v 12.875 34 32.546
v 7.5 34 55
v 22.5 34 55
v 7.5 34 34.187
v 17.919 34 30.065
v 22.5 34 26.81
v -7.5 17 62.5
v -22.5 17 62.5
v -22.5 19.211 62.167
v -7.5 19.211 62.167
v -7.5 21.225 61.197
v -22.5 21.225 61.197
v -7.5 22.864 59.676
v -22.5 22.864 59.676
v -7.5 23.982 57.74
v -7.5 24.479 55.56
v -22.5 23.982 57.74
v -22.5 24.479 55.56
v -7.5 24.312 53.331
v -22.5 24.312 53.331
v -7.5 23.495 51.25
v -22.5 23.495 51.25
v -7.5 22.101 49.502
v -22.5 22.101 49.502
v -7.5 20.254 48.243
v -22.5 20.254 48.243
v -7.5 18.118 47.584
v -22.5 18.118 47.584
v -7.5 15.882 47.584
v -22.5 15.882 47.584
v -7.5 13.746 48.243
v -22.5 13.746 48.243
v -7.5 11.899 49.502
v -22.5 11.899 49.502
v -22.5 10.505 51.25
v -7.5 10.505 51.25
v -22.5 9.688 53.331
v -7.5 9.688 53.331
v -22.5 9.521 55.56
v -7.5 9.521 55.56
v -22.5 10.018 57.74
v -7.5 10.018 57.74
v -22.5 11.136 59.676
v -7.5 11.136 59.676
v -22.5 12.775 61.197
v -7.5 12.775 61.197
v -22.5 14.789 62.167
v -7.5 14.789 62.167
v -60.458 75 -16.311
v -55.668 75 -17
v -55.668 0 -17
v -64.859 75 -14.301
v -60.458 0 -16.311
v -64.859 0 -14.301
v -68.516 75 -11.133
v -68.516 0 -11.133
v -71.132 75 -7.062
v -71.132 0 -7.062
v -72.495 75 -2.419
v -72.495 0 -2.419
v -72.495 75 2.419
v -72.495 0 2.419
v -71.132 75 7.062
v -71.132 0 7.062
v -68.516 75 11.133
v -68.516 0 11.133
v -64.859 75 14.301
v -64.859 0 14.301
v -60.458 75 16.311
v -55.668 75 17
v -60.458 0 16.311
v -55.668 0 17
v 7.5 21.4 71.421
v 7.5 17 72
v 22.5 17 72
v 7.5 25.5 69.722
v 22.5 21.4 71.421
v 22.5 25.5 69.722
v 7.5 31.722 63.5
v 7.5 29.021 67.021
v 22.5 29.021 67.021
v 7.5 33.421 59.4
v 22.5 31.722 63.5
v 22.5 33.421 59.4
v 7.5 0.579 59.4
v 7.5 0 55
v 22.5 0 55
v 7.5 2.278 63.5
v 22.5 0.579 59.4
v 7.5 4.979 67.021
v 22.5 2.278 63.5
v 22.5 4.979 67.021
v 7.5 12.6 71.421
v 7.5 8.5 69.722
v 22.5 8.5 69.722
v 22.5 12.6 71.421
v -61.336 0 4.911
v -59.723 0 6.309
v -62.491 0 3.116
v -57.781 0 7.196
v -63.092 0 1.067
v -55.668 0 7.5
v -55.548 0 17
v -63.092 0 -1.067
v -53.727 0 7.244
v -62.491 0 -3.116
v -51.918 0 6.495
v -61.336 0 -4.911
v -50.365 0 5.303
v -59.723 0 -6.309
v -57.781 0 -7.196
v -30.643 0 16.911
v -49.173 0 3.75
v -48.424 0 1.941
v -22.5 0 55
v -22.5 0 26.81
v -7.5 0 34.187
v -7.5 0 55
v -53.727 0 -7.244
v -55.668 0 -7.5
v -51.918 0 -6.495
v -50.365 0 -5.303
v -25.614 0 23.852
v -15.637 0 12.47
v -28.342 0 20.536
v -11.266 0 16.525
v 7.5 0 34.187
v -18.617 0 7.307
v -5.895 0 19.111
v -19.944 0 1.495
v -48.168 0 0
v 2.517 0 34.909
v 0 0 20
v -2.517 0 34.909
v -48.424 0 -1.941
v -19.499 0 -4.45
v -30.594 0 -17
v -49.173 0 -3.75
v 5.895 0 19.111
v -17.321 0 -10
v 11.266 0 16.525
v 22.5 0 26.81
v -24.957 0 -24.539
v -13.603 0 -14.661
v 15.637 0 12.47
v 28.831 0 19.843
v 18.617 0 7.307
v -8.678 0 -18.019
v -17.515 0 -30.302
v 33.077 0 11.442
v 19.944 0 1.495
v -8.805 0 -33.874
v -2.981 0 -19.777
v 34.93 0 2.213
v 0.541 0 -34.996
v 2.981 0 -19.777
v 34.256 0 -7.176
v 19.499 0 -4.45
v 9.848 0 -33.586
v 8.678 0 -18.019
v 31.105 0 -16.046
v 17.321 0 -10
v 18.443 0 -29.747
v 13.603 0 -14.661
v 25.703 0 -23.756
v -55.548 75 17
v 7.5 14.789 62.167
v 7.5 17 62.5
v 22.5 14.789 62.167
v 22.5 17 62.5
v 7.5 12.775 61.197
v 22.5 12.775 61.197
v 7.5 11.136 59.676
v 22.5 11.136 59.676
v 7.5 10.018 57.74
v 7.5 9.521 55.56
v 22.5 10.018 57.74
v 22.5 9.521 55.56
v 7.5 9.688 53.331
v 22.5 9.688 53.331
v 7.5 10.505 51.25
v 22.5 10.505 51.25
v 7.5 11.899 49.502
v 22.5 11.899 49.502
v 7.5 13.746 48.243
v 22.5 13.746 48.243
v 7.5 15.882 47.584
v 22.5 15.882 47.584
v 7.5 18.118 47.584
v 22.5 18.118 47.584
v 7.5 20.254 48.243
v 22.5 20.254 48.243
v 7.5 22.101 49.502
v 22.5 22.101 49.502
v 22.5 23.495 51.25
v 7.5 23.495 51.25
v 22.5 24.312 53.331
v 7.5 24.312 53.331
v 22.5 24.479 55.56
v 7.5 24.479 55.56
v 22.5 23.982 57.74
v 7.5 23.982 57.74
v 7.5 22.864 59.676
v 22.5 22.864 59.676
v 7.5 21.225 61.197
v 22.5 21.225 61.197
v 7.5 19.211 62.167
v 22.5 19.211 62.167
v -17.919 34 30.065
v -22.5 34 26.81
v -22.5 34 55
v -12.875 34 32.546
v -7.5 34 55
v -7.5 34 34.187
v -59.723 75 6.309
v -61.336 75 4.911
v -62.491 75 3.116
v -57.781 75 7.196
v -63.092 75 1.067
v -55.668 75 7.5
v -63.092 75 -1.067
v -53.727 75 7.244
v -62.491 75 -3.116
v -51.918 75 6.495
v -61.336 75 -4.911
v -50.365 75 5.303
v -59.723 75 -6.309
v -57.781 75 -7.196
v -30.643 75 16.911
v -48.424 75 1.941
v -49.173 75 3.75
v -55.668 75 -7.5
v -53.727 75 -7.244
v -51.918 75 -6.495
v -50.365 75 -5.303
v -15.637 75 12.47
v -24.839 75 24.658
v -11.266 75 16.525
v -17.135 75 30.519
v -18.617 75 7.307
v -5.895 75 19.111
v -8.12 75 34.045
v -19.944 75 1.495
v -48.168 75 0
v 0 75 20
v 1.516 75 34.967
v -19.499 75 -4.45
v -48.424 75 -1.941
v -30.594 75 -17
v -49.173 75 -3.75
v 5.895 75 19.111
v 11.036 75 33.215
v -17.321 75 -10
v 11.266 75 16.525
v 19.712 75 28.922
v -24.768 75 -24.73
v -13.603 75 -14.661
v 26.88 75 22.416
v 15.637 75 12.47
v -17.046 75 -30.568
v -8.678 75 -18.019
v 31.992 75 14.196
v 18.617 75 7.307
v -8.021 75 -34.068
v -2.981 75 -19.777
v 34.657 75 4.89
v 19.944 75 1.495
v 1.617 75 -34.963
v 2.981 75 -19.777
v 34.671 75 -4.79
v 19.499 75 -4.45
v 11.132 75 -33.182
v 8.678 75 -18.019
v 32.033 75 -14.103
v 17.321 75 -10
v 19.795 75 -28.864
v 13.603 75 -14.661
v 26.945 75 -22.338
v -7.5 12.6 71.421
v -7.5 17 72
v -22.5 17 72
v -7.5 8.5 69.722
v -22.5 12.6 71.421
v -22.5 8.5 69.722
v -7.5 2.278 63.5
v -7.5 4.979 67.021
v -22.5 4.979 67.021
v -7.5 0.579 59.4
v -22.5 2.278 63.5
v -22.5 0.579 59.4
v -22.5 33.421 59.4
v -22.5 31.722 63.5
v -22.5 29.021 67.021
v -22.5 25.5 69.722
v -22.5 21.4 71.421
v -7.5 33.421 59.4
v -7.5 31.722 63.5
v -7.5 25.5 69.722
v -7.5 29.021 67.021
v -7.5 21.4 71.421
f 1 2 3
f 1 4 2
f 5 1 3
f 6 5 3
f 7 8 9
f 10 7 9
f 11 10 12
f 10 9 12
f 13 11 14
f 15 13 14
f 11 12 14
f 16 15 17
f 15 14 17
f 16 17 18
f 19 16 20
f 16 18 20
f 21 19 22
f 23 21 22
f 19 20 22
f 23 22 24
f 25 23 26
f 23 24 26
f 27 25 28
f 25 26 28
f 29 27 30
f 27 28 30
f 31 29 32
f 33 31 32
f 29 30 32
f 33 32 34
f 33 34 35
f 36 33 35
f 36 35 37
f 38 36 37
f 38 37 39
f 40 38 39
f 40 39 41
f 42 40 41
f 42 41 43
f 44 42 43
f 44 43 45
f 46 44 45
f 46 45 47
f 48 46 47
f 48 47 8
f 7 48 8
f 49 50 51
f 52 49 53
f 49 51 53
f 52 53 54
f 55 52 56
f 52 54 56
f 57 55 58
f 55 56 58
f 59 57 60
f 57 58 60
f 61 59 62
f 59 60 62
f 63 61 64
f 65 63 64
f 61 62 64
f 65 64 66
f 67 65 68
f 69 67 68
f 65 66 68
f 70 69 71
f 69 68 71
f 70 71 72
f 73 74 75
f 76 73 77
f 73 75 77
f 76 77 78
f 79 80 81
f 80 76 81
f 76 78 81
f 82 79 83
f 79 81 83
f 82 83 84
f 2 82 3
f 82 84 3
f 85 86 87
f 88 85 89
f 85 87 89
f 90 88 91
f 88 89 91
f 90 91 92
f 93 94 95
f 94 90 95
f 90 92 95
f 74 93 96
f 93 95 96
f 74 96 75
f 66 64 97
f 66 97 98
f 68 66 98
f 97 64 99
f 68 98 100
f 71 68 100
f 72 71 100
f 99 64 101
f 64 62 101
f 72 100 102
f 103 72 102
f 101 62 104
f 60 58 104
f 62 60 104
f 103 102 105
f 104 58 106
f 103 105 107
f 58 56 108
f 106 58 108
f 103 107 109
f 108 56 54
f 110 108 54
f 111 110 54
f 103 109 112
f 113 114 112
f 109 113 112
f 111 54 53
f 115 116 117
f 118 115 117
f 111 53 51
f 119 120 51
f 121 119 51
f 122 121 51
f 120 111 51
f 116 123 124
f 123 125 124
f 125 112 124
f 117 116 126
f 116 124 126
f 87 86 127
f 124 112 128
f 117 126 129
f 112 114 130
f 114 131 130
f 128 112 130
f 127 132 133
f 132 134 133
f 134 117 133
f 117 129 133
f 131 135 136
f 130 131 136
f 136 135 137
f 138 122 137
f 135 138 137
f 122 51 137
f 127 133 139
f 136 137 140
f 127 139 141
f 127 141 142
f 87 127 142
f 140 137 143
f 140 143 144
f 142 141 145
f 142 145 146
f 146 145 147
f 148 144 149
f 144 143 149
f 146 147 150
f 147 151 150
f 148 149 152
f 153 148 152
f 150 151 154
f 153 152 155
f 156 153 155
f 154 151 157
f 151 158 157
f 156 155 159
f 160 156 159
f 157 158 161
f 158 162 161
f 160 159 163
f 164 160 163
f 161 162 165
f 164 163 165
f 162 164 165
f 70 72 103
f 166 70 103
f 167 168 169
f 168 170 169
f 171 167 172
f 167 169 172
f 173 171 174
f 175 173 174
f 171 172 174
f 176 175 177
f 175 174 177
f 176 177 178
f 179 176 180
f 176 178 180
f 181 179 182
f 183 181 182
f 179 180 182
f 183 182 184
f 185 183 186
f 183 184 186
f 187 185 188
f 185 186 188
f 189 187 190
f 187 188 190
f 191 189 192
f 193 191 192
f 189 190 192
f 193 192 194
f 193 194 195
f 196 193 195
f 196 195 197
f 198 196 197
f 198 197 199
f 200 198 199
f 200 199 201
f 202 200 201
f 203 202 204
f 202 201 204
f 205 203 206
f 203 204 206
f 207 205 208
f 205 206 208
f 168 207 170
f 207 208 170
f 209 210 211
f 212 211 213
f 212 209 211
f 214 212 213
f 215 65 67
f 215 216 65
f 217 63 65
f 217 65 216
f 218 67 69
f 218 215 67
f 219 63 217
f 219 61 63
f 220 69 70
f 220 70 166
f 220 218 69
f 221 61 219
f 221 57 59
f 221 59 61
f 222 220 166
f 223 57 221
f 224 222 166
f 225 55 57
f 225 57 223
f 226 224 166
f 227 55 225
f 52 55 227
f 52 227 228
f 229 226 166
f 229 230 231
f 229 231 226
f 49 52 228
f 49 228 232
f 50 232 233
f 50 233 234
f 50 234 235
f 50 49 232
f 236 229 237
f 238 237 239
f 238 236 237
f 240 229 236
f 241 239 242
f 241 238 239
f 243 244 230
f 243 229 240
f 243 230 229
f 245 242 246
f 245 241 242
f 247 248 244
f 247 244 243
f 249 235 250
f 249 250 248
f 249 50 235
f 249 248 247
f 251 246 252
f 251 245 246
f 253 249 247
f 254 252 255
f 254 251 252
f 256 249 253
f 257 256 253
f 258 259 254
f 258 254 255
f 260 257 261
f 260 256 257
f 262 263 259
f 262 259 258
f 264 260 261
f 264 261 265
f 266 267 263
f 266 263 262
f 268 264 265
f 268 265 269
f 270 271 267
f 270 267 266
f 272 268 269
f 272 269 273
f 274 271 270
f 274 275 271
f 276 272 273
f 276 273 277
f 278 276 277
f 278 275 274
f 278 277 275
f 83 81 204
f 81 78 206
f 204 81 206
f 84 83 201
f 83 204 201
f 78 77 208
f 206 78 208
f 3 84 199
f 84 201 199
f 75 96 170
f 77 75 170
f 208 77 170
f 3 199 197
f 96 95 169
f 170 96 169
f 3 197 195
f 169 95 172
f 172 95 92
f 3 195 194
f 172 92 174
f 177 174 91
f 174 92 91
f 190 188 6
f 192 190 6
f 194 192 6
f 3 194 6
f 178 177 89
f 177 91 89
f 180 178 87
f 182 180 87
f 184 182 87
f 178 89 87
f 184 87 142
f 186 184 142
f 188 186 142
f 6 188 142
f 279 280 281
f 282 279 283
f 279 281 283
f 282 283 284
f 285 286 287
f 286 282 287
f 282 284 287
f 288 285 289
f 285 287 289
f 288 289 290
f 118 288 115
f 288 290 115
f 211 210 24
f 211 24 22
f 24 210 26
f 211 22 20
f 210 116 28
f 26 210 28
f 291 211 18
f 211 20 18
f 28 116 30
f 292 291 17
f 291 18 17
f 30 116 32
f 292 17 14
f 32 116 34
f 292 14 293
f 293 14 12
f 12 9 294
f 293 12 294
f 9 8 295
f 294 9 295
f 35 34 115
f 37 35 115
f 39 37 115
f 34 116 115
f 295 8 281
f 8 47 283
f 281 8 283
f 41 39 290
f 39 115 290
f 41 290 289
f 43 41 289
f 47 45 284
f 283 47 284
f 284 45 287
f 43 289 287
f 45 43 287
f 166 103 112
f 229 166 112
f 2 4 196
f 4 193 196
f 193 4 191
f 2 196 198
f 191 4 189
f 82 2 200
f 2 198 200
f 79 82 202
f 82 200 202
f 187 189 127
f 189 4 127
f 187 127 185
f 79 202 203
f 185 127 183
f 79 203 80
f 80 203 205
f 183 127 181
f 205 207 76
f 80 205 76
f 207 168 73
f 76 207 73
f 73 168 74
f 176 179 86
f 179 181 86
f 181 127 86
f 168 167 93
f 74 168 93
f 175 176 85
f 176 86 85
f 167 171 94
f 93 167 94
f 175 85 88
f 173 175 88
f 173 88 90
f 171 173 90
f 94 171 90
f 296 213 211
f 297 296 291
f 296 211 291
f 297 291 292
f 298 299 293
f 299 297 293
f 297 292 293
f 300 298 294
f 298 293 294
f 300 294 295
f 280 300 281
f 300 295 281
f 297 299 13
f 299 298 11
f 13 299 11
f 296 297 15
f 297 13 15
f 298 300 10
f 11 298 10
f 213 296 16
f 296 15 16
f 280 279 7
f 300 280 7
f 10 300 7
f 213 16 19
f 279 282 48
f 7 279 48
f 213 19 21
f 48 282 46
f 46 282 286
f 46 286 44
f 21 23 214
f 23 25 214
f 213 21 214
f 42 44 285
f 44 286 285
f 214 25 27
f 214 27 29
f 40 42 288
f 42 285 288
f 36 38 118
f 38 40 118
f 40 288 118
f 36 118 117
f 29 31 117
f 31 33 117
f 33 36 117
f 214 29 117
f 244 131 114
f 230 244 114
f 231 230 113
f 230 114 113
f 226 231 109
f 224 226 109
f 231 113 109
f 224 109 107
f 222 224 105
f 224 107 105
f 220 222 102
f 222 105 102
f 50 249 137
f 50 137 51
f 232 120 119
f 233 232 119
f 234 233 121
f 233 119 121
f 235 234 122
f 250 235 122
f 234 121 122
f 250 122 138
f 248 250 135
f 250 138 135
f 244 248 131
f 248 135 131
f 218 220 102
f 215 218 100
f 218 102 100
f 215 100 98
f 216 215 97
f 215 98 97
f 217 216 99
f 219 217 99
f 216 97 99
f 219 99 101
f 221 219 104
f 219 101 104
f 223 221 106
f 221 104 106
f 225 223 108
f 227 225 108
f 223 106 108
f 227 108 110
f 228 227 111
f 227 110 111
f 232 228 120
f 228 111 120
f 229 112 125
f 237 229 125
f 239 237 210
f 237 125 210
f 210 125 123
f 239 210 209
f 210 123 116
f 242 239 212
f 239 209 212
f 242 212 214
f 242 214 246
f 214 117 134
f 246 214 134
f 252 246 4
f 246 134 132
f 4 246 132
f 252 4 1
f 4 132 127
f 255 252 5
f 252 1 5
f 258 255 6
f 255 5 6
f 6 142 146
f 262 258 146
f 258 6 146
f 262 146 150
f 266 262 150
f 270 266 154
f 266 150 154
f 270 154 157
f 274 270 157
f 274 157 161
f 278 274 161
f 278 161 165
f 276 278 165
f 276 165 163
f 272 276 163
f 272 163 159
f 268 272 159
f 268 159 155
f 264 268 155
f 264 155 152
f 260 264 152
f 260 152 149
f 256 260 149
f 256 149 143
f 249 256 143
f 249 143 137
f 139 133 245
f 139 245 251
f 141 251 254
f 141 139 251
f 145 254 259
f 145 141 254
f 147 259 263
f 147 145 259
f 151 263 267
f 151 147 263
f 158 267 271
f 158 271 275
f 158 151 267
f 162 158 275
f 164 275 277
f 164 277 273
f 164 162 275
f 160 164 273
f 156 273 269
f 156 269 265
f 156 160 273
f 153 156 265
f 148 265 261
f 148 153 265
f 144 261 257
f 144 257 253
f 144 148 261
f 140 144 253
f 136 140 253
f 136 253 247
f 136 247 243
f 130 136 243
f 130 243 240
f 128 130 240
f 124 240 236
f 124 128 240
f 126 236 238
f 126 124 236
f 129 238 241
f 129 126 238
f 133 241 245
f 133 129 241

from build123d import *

# Parameters (mm, degrees)
SKETCH1_R           = 7.5
SKETCH1_R_2         = 20
BOSS_EXTRUDE1_DEPTH = 75
BOSS_EXTRUDE2_DEPTH = 34
CUT_EXTRUDE1_REACH  = 120.808
SKETCH2_R           = 7.5
CUT_EXTRUDE2_REACH  = 142.947
SKETCH3_R           = 7.5


with BuildPart() as part:
    # Sketch1 → Boss-Extrude1 (new body)
    with BuildSketch(Plane(origin=(0, 0, 0), x_dir=(1, 0, 0), z_dir=(0, 1, 0))):
        with BuildLine():
            Line((-30.594117082, 17), (-55.668329577, 17))
            ThreePointArc((-55.668329577, 17), (-72.668329577, 0), (-55.668329577, -17))
            Line((-55.668329577, -17), (-30.643296936, -16.911190168))
            ThreePointArc((-30.643296936, -16.911190168), (34.999963193, -0.050758852), (-30.594117082, 17))
        make_face()
        with Locations((-55.668329577, 0)):
            Circle(SKETCH1_R, mode=Mode.SUBTRACT)
        Circle(SKETCH1_R_2, mode=Mode.SUBTRACT)
    extrude(amount=BOSS_EXTRUDE1_DEPTH)

    # Sketch1<4> → Boss-Extrude2 (add)
    with BuildSketch(Plane(origin=(0, 0, 0), x_dir=(1, 0, 0), z_dir=(0, 1, 0))):
        with BuildLine():
            Line((22.5, -72), (22.5, -26.809513237))
            ThreePointArc((22.5, -26.809513237), (15.446901808, -31.406897722), (7.5, -34.186985828))
            Line((7.5, -34.186985828), (7.5, -72))
            Line((7.5, -72), (22.5, -72))
        make_face()
        with BuildLine():
            ThreePointArc((-7.5, -34.186985828), (-15.446901808, -31.406897722), (-22.5, -26.809513237))
            Line((-22.5, -26.809513237), (-22.5, -72))
            Line((-22.5, -72), (-7.5, -72))
            Line((-7.5, -72), (-7.5, -34.186985828))
        make_face()
    extrude(amount=BOSS_EXTRUDE2_DEPTH)

    # Sketch2 → Cut-Extrude1 (cut, up to next)
    with BuildSketch(Plane.ZY.offset(22.5), mode=Mode.PRIVATE) as cut_extrude1_sk1:
        with BuildLine():
            Line((72, 0), (72, 17))
            ThreePointArc((72, 17), (67.02081528, 4.97918472), (55, 0))
            Line((55, 0), (72, 0))
        make_face()
    cut_extrude1_tool1 = extrude(cut_extrude1_sk1.sketch, amount=-CUT_EXTRUDE1_REACH, mode=Mode.PRIVATE) & part.part
    # Sketch2 → Cut-Extrude1 (cut, up to next)
    with BuildSketch(Plane.ZY.offset(22.5), mode=Mode.PRIVATE) as cut_extrude1_sk2:
        with BuildLine():
            Line((72, 34), (55, 34))
            ThreePointArc((55, 34), (67.02081528, 29.02081528), (72, 17))
            Line((72, 17), (72, 34))
        make_face()
    cut_extrude1_tool2 = extrude(cut_extrude1_sk2.sketch, amount=-CUT_EXTRUDE1_REACH, mode=Mode.PRIVATE) & part.part
    # Sketch2 → Cut-Extrude1 (cut, up to next)
    with BuildSketch(Plane.ZY.offset(22.5), mode=Mode.PRIVATE) as cut_extrude1_sk3:
        with Locations((55, 17)):
            Circle(SKETCH2_R)
    cut_extrude1_tool3 = extrude(cut_extrude1_sk3.sketch, amount=-CUT_EXTRUDE1_REACH, mode=Mode.PRIVATE) & part.part
    add(cut_extrude1_tool1.solids().sort_by_distance((-22.5, 3.797255, 68.202745))[0], mode=Mode.SUBTRACT)
    add(cut_extrude1_tool2.solids().sort_by_distance((-22.5, 30.202745, 68.202745))[0], mode=Mode.SUBTRACT)
    add(cut_extrude1_tool3.solids().sort_by_distance((-22.5, 17, 55))[0], mode=Mode.SUBTRACT)

    # Sketch3 → Cut-Extrude2 (cut, up to next)
    with BuildSketch(Plane(origin=(22.5, 0, 0), x_dir=(0, 0, -1), z_dir=(1, 0, 0)), mode=Mode.PRIVATE) as cut_extrude2_sk1:
        with BuildLine():
            ThreePointArc((-72, 17), (-67.02081528, 29.02081528), (-55, 34))
            Line((-55, 34), (-72, 34))
            Line((-72, 34), (-72, 17))
        make_face()
    cut_extrude2_tool1 = extrude(cut_extrude2_sk1.sketch, amount=-CUT_EXTRUDE2_REACH, mode=Mode.PRIVATE) & part.part
    # Sketch3 → Cut-Extrude2 (cut, up to next)
    with BuildSketch(Plane(origin=(22.5, 0, 0), x_dir=(0, 0, -1), z_dir=(1, 0, 0)), mode=Mode.PRIVATE) as cut_extrude2_sk2:
        with BuildLine():
            ThreePointArc((-55, 0), (-67.02081528, 4.97918472), (-72, 17))
            Line((-72, 17), (-72, 0))
            Line((-72, 0), (-55, 0))
        make_face()
    cut_extrude2_tool2 = extrude(cut_extrude2_sk2.sketch, amount=-CUT_EXTRUDE2_REACH, mode=Mode.PRIVATE) & part.part
    # Sketch3 → Cut-Extrude2 (cut, up to next)
    with BuildSketch(Plane(origin=(22.5, 0, 0), x_dir=(0, 0, -1), z_dir=(1, 0, 0)), mode=Mode.PRIVATE) as cut_extrude2_sk3:
        with Locations((-55, 17)):
            Circle(SKETCH3_R)
    cut_extrude2_tool3 = extrude(cut_extrude2_sk3.sketch, amount=-CUT_EXTRUDE2_REACH, mode=Mode.PRIVATE) & part.part
    add(cut_extrude2_tool1.solids().sort_by_distance((22.5, 30.202745, 68.202745))[0], mode=Mode.SUBTRACT)
    add(cut_extrude2_tool2.solids().sort_by_distance((22.5, 3.797255, 68.202745))[0], mode=Mode.SUBTRACT)
    add(cut_extrude2_tool3.solids().sort_by_distance((22.5, 17, 55))[0], mode=Mode.SUBTRACT)


solid = part.part
